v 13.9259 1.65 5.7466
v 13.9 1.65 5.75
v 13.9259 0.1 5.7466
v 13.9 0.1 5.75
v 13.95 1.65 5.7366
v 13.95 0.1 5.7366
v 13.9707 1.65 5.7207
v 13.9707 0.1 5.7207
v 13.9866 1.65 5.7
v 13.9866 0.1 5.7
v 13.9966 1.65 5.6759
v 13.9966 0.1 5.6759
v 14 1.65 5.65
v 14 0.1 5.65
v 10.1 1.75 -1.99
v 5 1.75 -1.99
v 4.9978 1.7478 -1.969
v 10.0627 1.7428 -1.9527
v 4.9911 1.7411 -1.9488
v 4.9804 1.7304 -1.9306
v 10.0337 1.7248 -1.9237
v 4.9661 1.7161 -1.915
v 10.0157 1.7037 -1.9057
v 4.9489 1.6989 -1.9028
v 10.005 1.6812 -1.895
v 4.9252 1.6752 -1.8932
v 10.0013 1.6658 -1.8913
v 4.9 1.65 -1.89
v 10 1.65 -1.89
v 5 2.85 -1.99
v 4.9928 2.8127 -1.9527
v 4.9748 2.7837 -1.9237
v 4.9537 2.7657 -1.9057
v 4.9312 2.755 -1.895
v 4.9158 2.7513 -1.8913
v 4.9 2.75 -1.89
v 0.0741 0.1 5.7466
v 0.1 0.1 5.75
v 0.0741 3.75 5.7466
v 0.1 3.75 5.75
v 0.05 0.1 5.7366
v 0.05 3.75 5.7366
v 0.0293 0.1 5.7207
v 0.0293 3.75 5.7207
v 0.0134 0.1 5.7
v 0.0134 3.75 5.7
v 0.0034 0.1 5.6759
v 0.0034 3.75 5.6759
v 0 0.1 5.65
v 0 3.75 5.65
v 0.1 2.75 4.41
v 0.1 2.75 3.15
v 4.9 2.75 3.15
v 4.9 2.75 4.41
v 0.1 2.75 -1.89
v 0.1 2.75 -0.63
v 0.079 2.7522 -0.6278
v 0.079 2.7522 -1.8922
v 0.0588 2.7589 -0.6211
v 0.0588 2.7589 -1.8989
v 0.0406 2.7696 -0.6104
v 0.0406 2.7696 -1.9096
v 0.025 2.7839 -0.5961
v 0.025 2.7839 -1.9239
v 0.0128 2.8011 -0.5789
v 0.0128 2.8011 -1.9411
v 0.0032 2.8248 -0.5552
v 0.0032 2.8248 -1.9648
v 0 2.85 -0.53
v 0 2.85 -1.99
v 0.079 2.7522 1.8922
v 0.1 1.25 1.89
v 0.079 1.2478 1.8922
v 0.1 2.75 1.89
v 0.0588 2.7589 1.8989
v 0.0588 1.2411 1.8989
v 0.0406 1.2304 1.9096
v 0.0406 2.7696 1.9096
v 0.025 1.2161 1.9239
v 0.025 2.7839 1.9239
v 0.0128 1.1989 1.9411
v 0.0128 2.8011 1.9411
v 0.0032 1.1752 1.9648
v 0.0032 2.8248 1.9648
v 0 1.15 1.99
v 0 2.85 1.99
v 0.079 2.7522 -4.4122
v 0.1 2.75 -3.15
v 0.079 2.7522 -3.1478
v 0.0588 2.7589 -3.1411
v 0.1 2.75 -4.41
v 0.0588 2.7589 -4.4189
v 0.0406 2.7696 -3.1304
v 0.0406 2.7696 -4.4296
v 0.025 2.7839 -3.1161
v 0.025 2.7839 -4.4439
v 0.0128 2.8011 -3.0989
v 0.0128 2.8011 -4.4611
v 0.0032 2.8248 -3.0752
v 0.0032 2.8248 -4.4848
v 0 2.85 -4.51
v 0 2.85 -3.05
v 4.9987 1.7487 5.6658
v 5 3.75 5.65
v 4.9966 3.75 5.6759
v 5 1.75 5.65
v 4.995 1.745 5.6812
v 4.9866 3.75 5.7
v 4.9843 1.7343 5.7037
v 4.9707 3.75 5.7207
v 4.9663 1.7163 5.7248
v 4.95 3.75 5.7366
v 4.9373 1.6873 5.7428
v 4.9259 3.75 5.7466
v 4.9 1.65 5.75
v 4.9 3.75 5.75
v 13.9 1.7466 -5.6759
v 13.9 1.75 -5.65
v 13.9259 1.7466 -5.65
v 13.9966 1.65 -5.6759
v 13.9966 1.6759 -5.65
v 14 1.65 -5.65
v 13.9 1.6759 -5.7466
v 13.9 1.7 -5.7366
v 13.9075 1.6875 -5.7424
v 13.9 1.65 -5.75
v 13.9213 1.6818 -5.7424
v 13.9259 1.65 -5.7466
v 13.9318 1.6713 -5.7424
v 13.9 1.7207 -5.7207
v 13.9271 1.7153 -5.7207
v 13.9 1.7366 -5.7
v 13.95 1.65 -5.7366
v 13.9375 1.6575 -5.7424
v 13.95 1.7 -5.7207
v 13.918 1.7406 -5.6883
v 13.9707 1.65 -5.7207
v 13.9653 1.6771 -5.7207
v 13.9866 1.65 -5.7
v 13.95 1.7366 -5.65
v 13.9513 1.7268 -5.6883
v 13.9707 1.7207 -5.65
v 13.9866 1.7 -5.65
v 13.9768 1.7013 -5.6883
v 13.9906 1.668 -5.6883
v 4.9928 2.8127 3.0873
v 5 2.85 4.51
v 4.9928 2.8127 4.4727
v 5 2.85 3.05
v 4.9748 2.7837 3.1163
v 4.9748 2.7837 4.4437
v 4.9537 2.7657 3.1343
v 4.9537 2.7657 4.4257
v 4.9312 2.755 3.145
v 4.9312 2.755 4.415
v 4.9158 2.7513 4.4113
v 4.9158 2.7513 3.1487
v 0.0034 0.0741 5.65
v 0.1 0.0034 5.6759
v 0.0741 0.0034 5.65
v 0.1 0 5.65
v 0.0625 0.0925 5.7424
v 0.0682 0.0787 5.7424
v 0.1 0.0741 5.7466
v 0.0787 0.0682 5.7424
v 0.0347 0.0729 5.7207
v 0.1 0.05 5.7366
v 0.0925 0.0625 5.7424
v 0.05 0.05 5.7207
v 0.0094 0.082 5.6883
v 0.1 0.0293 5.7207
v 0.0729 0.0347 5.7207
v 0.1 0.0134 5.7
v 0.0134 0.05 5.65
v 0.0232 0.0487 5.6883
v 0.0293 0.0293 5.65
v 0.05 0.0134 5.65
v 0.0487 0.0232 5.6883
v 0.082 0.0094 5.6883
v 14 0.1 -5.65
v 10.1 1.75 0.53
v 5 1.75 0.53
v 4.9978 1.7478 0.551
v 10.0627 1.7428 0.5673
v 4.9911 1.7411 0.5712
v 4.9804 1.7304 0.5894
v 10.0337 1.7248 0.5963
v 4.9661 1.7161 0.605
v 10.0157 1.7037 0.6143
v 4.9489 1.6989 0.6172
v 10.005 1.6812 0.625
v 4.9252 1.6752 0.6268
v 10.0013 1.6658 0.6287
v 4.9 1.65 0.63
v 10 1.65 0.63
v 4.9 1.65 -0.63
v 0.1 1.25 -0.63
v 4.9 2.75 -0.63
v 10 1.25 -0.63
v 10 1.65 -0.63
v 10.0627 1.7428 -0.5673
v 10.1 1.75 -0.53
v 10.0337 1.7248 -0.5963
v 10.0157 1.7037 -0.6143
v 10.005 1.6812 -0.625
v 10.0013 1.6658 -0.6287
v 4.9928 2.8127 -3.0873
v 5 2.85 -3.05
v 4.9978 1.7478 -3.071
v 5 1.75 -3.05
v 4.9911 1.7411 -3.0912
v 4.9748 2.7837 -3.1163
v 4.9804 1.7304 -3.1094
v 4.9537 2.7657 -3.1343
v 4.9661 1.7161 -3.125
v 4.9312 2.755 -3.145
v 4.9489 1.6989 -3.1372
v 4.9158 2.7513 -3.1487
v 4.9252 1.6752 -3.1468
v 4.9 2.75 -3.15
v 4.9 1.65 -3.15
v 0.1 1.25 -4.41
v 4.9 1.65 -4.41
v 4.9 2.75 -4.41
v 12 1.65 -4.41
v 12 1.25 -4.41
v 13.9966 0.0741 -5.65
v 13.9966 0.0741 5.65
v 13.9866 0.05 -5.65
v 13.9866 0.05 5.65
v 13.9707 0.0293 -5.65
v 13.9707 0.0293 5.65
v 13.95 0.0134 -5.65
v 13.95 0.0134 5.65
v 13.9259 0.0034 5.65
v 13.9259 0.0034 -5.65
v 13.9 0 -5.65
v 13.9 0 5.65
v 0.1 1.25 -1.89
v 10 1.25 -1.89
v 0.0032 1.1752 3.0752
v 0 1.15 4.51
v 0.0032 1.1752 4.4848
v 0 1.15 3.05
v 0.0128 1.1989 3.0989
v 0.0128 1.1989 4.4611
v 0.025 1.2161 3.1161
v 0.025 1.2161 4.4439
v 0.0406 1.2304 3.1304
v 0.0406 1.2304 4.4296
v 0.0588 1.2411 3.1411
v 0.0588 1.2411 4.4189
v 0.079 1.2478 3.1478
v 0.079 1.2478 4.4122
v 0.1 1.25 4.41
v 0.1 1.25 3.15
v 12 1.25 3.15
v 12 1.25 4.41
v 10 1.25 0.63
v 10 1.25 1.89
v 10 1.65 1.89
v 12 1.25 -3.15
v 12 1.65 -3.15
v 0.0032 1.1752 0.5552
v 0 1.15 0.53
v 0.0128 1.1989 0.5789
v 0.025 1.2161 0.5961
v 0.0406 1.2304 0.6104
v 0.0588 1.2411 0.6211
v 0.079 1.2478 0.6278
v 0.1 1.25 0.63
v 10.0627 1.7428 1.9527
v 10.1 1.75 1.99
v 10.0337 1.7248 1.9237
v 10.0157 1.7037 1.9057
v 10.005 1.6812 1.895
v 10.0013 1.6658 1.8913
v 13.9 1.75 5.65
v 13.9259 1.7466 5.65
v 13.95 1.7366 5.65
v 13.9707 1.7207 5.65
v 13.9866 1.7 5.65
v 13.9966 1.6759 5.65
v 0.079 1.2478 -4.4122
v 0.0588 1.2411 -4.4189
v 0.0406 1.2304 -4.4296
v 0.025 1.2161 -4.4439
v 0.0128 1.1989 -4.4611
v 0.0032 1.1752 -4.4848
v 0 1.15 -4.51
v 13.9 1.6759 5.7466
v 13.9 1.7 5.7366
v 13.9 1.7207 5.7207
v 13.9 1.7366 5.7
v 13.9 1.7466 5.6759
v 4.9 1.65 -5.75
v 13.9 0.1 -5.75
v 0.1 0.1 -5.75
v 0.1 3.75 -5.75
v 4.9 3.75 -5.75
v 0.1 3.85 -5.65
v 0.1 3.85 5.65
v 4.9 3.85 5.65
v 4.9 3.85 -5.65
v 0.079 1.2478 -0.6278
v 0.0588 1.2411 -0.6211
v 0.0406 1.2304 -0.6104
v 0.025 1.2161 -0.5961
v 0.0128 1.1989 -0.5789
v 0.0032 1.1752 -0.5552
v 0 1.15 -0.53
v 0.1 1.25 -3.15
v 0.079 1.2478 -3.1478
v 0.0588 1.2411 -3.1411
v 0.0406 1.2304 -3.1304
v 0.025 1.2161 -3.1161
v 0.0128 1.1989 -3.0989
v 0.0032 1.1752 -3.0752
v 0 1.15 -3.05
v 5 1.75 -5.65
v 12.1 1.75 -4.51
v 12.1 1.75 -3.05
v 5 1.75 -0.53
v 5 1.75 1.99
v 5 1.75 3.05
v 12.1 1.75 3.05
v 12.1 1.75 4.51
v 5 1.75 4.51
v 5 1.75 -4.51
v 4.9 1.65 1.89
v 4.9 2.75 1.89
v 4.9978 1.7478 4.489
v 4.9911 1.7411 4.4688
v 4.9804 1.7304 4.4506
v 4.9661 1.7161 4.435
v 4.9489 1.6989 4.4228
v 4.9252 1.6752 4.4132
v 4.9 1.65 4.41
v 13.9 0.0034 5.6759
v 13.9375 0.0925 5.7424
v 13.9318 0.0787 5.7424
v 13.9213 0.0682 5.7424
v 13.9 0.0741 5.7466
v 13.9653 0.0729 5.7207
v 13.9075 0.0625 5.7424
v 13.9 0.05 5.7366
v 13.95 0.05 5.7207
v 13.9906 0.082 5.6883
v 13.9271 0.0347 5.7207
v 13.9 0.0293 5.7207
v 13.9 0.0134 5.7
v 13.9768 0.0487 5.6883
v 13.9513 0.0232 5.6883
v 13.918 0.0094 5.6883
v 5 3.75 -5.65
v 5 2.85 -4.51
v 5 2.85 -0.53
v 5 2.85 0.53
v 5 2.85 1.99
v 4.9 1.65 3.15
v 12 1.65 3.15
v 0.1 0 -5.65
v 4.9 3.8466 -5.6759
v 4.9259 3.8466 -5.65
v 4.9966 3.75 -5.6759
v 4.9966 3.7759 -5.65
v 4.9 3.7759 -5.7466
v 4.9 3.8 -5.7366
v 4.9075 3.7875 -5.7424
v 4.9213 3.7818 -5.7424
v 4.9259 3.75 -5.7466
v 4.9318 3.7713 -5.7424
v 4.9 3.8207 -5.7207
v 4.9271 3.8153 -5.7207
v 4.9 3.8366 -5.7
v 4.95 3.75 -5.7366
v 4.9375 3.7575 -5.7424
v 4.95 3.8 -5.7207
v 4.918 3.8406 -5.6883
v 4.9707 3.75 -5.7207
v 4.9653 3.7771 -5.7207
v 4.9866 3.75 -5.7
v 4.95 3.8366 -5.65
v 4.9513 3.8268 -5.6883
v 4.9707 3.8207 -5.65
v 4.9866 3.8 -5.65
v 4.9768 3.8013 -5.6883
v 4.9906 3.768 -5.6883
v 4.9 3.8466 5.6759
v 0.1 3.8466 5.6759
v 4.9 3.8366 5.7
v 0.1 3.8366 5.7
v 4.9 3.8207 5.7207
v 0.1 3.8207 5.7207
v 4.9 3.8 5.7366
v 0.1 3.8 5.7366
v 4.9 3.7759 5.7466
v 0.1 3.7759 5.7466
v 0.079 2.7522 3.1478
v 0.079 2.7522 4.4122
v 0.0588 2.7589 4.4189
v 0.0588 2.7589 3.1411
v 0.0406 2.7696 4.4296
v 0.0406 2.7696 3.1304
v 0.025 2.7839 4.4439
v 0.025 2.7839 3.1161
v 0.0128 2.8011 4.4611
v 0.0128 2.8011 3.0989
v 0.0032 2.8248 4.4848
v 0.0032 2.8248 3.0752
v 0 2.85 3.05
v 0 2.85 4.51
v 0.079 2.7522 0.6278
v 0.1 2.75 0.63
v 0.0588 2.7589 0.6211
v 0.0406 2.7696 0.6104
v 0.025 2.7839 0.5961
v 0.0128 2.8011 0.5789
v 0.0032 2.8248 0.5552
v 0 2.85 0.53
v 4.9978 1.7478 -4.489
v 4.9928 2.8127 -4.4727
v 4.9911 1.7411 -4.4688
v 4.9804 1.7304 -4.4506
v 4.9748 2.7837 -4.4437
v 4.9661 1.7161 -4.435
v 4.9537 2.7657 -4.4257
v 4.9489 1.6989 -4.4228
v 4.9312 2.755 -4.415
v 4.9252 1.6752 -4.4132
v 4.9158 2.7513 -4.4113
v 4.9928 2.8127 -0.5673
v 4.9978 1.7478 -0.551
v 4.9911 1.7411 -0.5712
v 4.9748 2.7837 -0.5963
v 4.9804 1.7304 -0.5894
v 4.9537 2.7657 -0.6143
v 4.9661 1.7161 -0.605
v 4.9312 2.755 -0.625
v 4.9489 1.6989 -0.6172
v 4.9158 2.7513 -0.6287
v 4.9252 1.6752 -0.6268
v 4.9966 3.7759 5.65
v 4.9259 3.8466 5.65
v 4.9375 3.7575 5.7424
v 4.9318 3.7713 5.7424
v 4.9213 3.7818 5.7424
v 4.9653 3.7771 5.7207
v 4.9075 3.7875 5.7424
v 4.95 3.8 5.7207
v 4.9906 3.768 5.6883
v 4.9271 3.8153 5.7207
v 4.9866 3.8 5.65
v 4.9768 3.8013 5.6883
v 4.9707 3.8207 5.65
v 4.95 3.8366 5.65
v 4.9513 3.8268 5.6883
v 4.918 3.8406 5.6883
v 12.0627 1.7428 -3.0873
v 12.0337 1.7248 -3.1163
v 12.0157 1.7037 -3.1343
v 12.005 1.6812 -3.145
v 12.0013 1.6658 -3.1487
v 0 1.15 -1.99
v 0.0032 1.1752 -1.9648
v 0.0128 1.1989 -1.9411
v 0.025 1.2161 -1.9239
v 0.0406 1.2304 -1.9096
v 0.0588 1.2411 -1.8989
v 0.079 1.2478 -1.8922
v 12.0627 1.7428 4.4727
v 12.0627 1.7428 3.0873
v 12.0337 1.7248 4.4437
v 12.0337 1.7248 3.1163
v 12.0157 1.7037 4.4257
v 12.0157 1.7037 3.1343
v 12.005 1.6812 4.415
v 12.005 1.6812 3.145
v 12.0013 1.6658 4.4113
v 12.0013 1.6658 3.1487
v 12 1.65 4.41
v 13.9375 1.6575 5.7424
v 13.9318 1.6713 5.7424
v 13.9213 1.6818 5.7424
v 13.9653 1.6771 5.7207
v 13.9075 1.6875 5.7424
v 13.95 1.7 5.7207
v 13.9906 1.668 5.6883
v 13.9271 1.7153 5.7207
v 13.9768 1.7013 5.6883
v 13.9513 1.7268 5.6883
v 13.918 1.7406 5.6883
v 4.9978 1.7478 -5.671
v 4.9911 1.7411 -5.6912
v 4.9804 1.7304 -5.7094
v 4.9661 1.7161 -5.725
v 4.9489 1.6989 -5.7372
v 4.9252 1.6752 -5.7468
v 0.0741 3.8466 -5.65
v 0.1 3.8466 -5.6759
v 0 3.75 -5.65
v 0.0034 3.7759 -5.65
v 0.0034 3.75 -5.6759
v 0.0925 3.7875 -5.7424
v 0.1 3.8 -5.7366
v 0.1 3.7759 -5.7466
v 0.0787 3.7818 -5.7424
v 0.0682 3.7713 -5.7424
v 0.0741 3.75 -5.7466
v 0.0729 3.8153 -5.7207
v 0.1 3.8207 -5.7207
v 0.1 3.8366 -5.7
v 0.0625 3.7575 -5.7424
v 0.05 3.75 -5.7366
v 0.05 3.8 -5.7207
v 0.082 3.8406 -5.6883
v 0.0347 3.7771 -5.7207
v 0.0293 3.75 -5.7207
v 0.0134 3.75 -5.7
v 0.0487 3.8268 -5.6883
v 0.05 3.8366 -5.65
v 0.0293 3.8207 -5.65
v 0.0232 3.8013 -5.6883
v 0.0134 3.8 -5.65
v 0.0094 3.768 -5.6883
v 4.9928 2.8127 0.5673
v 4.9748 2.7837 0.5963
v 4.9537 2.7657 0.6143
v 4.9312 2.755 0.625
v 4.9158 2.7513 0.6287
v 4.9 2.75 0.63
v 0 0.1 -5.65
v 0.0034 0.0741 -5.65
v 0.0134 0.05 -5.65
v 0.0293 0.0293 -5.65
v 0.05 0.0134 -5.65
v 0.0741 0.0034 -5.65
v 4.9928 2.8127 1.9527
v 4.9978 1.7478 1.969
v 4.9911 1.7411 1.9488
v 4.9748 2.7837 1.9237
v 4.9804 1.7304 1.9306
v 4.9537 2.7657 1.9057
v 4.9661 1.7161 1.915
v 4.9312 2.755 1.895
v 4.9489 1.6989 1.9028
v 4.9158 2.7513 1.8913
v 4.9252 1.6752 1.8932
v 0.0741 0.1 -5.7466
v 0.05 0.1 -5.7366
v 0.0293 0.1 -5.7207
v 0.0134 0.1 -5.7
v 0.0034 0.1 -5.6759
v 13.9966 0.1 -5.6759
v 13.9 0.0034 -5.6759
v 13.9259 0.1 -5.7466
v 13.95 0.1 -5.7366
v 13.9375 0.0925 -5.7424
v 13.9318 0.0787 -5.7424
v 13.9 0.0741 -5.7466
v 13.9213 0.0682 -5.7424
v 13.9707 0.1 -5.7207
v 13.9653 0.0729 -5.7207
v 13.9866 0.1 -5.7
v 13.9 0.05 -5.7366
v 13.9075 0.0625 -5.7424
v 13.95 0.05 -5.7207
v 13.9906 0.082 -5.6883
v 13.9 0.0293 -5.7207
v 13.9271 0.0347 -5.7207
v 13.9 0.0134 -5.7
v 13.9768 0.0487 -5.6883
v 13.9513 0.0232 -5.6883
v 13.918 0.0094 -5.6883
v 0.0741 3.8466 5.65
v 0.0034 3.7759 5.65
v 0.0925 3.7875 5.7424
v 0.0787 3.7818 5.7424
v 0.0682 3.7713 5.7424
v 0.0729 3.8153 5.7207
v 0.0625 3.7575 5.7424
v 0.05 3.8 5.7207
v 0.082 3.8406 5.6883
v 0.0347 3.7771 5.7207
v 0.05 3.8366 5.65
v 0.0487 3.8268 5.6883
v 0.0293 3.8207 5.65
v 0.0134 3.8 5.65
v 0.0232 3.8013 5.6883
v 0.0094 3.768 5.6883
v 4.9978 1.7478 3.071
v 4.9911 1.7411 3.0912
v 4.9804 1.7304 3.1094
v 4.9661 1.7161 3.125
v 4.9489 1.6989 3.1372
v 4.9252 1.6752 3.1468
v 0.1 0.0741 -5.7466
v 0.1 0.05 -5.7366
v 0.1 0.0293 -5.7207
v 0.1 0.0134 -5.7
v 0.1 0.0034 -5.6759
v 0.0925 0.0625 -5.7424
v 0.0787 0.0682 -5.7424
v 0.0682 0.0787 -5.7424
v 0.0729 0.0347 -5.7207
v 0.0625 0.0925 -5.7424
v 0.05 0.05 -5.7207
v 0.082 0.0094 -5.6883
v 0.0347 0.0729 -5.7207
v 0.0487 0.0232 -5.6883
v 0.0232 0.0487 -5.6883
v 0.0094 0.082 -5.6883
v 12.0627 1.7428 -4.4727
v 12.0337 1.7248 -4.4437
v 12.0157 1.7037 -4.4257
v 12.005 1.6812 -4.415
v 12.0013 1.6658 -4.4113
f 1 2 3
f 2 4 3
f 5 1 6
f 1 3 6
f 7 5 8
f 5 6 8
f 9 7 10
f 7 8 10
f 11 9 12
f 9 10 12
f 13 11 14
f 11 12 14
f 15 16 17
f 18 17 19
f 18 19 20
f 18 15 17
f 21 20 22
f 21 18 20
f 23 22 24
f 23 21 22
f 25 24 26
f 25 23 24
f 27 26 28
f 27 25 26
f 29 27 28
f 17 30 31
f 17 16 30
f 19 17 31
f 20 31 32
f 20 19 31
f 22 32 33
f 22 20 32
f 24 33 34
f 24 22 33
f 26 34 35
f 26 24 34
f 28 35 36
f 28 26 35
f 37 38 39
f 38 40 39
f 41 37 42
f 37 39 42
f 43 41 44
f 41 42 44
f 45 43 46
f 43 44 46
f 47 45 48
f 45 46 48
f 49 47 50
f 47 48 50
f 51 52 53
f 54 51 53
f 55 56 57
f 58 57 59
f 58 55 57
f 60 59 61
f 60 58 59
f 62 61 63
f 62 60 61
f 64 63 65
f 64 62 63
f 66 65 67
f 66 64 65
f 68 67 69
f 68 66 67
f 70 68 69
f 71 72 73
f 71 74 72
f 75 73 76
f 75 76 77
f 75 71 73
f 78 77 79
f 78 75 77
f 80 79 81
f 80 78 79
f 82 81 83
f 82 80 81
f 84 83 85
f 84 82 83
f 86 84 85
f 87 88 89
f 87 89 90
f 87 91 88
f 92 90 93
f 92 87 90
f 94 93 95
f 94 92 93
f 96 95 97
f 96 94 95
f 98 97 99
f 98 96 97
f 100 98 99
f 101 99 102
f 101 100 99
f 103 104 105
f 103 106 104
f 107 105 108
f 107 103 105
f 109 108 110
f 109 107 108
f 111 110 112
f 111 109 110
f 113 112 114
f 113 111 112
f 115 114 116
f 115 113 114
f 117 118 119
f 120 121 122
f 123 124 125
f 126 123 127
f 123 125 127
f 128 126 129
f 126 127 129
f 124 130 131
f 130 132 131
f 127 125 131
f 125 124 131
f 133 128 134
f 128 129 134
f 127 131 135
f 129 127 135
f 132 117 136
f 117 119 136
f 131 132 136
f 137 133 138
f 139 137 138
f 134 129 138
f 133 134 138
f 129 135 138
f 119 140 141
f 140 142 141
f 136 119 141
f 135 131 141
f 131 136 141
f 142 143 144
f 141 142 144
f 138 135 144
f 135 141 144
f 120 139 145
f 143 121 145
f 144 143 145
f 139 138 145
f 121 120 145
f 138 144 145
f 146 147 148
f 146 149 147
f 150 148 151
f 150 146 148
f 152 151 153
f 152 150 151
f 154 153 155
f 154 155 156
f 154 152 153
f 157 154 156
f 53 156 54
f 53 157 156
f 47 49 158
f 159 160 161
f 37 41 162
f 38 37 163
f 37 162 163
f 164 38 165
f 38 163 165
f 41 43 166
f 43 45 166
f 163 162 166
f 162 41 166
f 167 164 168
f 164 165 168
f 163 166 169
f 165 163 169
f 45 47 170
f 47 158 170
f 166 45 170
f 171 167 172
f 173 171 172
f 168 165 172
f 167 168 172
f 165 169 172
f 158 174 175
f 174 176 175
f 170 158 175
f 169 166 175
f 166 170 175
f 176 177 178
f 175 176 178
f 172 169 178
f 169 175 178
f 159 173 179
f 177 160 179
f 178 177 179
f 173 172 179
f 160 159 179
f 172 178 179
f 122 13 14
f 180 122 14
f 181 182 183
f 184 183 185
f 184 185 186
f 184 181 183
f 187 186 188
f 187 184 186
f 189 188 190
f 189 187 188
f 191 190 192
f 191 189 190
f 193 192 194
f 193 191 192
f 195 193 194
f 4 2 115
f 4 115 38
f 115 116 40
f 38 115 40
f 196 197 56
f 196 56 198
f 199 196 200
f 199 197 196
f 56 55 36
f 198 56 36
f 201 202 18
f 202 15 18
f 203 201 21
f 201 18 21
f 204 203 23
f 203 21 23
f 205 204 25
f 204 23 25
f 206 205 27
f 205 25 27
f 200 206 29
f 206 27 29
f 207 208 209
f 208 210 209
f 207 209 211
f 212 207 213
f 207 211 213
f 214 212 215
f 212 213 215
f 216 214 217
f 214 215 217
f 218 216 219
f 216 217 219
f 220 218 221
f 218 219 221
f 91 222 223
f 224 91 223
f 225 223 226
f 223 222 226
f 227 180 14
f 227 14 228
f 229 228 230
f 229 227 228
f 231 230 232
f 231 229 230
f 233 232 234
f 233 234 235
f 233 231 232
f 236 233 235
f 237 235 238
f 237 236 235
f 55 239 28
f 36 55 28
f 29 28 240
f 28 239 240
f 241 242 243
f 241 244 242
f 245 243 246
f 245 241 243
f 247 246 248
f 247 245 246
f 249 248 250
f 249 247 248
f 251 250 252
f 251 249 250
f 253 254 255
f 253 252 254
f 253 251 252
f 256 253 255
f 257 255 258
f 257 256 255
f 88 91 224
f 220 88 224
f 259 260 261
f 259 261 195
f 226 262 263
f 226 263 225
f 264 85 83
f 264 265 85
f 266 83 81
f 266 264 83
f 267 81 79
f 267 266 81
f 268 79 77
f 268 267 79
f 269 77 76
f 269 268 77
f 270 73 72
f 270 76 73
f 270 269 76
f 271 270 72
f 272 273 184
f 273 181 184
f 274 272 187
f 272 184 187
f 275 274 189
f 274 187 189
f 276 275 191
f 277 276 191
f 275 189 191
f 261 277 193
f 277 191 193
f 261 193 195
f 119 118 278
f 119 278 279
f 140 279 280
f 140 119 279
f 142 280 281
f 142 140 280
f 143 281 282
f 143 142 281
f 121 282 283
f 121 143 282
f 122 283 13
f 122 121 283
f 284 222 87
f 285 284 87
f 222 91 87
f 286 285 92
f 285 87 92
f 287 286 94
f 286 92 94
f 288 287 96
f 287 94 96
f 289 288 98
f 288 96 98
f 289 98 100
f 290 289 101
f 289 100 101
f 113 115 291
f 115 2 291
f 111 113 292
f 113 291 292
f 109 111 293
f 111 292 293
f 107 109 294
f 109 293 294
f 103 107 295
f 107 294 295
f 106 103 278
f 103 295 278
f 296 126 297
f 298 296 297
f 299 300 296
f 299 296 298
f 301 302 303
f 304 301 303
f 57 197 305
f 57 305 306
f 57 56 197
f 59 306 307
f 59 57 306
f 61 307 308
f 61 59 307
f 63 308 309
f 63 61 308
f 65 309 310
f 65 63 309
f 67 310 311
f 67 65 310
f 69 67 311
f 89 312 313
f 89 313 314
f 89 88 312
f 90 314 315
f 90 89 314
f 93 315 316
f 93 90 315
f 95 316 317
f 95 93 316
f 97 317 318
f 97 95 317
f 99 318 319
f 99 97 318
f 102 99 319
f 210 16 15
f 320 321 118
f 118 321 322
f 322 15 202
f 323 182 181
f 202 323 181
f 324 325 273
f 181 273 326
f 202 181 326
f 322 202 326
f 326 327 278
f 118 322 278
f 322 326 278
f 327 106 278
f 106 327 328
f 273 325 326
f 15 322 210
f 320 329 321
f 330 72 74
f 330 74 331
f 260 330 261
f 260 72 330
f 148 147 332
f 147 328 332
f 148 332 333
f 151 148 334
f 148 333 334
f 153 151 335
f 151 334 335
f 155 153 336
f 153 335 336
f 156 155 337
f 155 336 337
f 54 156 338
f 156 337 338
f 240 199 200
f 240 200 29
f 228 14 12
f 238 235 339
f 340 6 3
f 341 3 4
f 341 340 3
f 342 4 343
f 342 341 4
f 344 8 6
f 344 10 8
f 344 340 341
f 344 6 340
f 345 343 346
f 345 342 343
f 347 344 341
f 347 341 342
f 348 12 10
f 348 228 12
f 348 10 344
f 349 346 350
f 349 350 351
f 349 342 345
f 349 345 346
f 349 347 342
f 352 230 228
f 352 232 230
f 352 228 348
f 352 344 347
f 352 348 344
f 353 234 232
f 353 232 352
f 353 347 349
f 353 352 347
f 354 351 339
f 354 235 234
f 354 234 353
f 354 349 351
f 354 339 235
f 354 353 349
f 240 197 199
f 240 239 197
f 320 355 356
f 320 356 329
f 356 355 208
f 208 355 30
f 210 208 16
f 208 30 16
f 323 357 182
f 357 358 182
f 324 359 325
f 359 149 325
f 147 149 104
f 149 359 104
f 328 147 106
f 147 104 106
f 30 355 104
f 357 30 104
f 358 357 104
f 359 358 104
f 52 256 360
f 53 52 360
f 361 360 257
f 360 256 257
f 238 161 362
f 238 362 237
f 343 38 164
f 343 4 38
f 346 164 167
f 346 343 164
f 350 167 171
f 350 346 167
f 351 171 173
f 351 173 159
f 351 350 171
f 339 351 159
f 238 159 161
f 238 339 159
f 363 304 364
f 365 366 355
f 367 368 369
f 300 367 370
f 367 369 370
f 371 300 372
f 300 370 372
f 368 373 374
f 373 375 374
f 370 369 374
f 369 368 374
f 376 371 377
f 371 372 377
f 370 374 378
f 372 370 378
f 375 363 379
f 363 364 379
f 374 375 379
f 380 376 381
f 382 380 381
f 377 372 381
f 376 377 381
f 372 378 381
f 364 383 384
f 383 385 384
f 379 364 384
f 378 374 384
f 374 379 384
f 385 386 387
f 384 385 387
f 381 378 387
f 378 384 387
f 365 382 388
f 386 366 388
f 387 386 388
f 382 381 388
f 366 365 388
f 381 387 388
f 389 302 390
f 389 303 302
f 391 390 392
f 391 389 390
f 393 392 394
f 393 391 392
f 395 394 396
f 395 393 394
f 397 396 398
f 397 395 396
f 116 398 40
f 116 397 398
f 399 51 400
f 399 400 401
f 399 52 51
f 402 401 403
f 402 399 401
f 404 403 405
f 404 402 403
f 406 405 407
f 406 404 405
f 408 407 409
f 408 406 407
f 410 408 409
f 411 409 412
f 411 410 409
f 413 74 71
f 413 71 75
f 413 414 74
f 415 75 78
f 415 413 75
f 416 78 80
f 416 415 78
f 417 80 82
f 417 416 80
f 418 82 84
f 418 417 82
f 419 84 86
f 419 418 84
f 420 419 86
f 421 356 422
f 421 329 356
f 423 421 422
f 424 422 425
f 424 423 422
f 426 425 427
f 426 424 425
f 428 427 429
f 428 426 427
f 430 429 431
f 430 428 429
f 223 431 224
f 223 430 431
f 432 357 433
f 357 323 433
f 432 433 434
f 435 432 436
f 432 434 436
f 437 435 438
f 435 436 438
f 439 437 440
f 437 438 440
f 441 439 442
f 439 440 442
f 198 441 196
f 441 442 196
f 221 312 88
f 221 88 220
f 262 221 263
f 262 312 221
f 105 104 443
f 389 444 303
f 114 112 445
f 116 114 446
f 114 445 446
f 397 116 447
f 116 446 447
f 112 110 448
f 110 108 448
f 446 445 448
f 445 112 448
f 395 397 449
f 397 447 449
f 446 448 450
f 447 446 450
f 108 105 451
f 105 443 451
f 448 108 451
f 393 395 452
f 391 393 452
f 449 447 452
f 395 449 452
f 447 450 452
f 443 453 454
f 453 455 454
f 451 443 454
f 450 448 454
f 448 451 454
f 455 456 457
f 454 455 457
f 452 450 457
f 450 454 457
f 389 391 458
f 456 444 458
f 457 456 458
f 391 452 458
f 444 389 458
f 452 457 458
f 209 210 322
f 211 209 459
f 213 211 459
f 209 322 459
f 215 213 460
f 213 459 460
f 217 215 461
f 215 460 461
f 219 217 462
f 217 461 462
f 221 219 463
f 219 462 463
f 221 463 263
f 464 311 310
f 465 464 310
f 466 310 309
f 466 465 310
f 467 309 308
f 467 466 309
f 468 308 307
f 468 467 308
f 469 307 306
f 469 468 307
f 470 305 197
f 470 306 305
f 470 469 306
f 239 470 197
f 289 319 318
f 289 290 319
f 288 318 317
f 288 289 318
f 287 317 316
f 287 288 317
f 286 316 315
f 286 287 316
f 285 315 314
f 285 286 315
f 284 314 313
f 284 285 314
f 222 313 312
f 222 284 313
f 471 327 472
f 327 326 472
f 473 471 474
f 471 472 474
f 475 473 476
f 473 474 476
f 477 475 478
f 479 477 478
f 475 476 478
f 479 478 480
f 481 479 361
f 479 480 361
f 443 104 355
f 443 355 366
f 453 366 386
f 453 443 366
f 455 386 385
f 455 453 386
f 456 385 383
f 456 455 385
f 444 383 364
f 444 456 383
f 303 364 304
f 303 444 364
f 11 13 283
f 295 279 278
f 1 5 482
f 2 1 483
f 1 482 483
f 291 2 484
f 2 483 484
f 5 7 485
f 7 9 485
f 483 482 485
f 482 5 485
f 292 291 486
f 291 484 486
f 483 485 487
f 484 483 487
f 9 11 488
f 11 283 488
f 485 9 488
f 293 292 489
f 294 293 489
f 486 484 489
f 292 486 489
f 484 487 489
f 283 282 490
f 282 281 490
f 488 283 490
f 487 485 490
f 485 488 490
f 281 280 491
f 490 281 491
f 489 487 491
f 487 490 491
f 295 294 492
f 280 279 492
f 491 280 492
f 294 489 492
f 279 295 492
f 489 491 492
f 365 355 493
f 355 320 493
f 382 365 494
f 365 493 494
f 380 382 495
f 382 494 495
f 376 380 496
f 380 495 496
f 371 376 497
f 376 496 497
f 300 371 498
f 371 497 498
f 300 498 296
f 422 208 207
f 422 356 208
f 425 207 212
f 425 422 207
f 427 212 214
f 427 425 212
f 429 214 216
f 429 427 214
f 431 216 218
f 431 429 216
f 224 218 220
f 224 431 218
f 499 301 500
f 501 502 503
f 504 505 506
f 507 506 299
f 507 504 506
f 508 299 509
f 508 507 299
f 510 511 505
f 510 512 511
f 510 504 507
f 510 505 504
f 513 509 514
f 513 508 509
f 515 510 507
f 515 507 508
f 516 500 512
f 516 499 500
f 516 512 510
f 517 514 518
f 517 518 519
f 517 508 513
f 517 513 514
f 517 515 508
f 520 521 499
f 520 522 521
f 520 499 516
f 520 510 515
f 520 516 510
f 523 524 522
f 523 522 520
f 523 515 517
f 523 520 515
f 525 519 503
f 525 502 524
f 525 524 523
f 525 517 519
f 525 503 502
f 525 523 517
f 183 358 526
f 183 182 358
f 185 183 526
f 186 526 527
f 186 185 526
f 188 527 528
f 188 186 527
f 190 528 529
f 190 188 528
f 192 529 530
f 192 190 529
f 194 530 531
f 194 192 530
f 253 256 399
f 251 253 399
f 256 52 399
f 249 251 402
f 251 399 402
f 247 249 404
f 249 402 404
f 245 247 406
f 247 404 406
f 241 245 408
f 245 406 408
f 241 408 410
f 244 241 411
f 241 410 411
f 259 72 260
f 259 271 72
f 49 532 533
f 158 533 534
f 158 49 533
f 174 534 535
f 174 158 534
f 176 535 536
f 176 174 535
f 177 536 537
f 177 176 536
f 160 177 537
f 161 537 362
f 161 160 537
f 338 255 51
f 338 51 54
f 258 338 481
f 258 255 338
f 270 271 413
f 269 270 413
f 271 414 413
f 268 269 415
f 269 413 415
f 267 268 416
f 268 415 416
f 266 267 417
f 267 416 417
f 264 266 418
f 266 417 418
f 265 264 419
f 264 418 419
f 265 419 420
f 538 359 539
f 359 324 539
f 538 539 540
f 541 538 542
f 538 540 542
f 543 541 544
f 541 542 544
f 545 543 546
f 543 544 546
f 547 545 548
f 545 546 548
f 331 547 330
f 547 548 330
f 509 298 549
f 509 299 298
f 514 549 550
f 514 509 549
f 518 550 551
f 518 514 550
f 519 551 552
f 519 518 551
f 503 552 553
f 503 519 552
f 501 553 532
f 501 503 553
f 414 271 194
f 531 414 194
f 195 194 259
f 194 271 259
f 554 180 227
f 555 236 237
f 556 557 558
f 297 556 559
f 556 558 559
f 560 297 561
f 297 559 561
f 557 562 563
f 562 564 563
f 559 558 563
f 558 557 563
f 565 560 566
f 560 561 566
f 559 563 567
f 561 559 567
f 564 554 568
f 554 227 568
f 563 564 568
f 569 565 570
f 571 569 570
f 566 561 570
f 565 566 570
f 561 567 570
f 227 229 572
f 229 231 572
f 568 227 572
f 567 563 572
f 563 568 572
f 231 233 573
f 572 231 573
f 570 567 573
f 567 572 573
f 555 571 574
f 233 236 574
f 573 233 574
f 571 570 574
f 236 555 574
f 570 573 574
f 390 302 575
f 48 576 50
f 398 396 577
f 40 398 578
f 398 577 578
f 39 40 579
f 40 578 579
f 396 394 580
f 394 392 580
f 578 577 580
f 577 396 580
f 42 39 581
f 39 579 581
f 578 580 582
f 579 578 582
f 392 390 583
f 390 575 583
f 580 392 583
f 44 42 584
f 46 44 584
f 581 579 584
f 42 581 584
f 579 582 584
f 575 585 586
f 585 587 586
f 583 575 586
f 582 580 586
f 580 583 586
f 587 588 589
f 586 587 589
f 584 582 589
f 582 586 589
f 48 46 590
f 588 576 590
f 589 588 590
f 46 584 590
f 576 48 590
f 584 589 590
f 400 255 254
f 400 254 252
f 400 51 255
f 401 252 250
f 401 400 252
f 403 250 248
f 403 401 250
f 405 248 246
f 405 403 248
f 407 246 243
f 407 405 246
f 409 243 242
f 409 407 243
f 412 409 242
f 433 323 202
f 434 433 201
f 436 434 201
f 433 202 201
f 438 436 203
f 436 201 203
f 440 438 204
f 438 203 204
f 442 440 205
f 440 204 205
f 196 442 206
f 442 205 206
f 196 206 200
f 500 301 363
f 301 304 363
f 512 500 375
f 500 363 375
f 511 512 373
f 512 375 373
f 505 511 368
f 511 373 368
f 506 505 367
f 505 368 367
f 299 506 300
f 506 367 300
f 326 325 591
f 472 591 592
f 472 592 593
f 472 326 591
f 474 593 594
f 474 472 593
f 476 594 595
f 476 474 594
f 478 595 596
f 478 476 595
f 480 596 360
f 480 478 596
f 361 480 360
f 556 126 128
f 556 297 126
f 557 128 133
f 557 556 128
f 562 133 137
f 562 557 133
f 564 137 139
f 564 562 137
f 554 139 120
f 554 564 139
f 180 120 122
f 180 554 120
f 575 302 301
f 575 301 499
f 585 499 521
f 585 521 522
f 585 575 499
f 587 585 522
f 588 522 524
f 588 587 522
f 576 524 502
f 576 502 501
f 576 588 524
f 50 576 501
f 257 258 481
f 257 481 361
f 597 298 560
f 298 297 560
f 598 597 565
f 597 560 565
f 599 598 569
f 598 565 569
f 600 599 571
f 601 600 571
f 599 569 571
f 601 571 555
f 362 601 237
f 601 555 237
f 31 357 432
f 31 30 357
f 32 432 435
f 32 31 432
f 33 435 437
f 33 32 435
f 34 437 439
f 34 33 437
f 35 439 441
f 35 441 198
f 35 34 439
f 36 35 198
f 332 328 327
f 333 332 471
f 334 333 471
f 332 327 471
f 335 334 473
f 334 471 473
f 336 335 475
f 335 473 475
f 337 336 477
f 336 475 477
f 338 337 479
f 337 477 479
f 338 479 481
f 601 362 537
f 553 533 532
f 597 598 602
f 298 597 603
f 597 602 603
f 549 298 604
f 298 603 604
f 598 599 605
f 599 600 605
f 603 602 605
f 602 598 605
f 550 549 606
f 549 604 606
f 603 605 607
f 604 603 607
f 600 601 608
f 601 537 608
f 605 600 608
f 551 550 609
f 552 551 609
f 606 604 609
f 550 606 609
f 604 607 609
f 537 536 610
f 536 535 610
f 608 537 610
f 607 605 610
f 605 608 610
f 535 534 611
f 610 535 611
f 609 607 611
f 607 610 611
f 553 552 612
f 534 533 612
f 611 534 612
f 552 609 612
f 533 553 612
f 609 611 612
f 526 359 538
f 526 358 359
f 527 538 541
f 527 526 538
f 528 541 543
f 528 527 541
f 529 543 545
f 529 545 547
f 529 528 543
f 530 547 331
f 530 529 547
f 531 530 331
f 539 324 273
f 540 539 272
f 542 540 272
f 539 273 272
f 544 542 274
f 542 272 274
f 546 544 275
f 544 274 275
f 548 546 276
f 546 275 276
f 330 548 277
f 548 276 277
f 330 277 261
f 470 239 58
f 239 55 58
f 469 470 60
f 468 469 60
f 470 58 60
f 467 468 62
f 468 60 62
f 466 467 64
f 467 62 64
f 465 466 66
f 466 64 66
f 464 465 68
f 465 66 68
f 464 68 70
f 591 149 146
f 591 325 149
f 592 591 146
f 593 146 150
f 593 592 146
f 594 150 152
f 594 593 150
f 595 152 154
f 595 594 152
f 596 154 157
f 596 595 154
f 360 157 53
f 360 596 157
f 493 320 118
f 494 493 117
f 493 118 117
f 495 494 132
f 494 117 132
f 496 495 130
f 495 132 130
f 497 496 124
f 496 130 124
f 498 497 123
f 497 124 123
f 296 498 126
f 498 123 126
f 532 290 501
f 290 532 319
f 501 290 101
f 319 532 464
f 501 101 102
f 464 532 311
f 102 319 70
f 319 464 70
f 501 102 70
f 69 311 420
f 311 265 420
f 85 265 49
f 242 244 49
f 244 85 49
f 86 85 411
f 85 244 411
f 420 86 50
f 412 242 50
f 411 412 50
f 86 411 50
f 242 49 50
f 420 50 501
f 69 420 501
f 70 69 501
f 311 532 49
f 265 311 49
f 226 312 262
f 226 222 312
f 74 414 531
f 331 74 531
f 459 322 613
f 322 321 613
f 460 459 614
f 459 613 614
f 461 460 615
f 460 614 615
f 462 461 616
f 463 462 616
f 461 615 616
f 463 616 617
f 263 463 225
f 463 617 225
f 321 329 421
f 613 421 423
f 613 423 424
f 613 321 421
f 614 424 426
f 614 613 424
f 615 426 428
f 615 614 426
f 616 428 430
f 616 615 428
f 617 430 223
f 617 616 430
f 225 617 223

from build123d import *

# Parameters (mm, degrees)
BOSS_EXTRUDE1_DEPTH     = 5.75
CUT_EXTRUDE1_DEPTH      = 1
CUT_EXTRUDE1_DEPTH_BACK = 0.5
SKETCH2_W               = 12
SKETCH2_H               = 1.26
SKETCH2_W_2             = 10
FILLET1_R               = 0.1


with BuildPart() as part:
    # Sketch1 → Boss-Extrude1 (new, symmetric)
    with BuildSketch(Plane.XY):
        Polygon((5, 3.85), (5, 1.75), (14, 1.75), (14, 0), (5, 0), (0, 0), (0, 3.85), align=None)
    extrude(amount=BOSS_EXTRUDE1_DEPTH, both=True)

    # Sketch2 → Cut-Extrude1 (cut, two sides: drawn at the far end of the back side and taken through both)
    with BuildSketch(Plane(origin=(0, 1.75, 0), x_dir=(1, 0, 0), z_dir=(0, 1, 0)).offset(-CUT_EXTRUDE1_DEPTH_BACK)):
        with Locations((6, 3.78)):
            Rectangle(SKETCH2_W, SKETCH2_H)
        with Locations((5, 1.26)):
            Rectangle(SKETCH2_W_2, SKETCH2_H)
        with Locations((5, -1.26)):
            Rectangle(SKETCH2_W_2, SKETCH2_H)
        with Locations((6, -3.78)):
            Rectangle(SKETCH2_W, SKETCH2_H)
    extrude(amount=CUT_EXTRUDE1_DEPTH + CUT_EXTRUDE1_DEPTH_BACK, mode=Mode.SUBTRACT)

    # Fillet1
    fillet1_edges = [part.edges().sort_by_distance(p)[0] for p in [
        (0, 3.85, 0),
        (5, 3.85, 0),
        (14, 1.75, 0),
        (14, 0, 0),
        (0, 0, 0),
        (14, 0.875, 5.75),
        (9.5, 1.75, 5.75),
        (5, 2.8, 5.75),
        (2.5, 3.85, 5.75),
        (5, 2.75, 3.78),
        (5, 2.25, 3.15),
        (5, 2.25, 4.41),
        (5, 2.75, 1.26),
        (5, 2.25, 0.63),
        (5, 2.25, 1.89),
        (5, 2.75, -1.26),
        (5, 2.25, -1.89),
        (5, 2.25, -0.63),
        (5, 2.75, -3.78),
        (5, 2.25, -4.41),
        (5, 2.25, -3.15),
        (12, 1.75, 3.78),
        (10, 1.75, 1.26),
        (10, 1.75, -1.26),
        (12, 1.75, -3.78),
        (0, 1.925, 5.75),
        (0, 2, -3.15),
        (0, 2.75, -3.78),
        (0, 2, -4.41),
        (0, 1.25, -3.78),
        (8.5, 1.75, -3.15),
        (8.5, 1.75, -4.41),
        (0, 2, -0.63),
        (0, 2.75, -1.26),
        (0, 2, -1.89),
        (0, 1.25, -1.26),
        (7.5, 1.75, -0.63),
        (7.5, 1.75, -1.89),
        (0, 2, 1.89),
        (0, 2.75, 1.26),
        (7.5, 1.75, 1.89),
        (7.5, 1.75, 0.63),
        (0, 2, 0.63),
        (0, 1.25, 1.26),
        (2.5, 3.85, -5.75),
        (7, 0, 5.75),
        (0, 2, 4.41),
        (0, 2.75, 3.78),
        (8.5, 1.75, 4.41),
        (8.5, 1.75, 3.15),
        (0, 2, 3.15),
        (0, 1.25, 3.78),
        (5, 2.8, -5.75),
        (9.5, 1.75, -5.75),
        (14, 0.875, -5.75),
        (7, 0, -5.75),
        (0, 1.925, -5.75),
    ]]
    fillet(fillet1_edges, radius=FILLET1_R)


solid = part.part
